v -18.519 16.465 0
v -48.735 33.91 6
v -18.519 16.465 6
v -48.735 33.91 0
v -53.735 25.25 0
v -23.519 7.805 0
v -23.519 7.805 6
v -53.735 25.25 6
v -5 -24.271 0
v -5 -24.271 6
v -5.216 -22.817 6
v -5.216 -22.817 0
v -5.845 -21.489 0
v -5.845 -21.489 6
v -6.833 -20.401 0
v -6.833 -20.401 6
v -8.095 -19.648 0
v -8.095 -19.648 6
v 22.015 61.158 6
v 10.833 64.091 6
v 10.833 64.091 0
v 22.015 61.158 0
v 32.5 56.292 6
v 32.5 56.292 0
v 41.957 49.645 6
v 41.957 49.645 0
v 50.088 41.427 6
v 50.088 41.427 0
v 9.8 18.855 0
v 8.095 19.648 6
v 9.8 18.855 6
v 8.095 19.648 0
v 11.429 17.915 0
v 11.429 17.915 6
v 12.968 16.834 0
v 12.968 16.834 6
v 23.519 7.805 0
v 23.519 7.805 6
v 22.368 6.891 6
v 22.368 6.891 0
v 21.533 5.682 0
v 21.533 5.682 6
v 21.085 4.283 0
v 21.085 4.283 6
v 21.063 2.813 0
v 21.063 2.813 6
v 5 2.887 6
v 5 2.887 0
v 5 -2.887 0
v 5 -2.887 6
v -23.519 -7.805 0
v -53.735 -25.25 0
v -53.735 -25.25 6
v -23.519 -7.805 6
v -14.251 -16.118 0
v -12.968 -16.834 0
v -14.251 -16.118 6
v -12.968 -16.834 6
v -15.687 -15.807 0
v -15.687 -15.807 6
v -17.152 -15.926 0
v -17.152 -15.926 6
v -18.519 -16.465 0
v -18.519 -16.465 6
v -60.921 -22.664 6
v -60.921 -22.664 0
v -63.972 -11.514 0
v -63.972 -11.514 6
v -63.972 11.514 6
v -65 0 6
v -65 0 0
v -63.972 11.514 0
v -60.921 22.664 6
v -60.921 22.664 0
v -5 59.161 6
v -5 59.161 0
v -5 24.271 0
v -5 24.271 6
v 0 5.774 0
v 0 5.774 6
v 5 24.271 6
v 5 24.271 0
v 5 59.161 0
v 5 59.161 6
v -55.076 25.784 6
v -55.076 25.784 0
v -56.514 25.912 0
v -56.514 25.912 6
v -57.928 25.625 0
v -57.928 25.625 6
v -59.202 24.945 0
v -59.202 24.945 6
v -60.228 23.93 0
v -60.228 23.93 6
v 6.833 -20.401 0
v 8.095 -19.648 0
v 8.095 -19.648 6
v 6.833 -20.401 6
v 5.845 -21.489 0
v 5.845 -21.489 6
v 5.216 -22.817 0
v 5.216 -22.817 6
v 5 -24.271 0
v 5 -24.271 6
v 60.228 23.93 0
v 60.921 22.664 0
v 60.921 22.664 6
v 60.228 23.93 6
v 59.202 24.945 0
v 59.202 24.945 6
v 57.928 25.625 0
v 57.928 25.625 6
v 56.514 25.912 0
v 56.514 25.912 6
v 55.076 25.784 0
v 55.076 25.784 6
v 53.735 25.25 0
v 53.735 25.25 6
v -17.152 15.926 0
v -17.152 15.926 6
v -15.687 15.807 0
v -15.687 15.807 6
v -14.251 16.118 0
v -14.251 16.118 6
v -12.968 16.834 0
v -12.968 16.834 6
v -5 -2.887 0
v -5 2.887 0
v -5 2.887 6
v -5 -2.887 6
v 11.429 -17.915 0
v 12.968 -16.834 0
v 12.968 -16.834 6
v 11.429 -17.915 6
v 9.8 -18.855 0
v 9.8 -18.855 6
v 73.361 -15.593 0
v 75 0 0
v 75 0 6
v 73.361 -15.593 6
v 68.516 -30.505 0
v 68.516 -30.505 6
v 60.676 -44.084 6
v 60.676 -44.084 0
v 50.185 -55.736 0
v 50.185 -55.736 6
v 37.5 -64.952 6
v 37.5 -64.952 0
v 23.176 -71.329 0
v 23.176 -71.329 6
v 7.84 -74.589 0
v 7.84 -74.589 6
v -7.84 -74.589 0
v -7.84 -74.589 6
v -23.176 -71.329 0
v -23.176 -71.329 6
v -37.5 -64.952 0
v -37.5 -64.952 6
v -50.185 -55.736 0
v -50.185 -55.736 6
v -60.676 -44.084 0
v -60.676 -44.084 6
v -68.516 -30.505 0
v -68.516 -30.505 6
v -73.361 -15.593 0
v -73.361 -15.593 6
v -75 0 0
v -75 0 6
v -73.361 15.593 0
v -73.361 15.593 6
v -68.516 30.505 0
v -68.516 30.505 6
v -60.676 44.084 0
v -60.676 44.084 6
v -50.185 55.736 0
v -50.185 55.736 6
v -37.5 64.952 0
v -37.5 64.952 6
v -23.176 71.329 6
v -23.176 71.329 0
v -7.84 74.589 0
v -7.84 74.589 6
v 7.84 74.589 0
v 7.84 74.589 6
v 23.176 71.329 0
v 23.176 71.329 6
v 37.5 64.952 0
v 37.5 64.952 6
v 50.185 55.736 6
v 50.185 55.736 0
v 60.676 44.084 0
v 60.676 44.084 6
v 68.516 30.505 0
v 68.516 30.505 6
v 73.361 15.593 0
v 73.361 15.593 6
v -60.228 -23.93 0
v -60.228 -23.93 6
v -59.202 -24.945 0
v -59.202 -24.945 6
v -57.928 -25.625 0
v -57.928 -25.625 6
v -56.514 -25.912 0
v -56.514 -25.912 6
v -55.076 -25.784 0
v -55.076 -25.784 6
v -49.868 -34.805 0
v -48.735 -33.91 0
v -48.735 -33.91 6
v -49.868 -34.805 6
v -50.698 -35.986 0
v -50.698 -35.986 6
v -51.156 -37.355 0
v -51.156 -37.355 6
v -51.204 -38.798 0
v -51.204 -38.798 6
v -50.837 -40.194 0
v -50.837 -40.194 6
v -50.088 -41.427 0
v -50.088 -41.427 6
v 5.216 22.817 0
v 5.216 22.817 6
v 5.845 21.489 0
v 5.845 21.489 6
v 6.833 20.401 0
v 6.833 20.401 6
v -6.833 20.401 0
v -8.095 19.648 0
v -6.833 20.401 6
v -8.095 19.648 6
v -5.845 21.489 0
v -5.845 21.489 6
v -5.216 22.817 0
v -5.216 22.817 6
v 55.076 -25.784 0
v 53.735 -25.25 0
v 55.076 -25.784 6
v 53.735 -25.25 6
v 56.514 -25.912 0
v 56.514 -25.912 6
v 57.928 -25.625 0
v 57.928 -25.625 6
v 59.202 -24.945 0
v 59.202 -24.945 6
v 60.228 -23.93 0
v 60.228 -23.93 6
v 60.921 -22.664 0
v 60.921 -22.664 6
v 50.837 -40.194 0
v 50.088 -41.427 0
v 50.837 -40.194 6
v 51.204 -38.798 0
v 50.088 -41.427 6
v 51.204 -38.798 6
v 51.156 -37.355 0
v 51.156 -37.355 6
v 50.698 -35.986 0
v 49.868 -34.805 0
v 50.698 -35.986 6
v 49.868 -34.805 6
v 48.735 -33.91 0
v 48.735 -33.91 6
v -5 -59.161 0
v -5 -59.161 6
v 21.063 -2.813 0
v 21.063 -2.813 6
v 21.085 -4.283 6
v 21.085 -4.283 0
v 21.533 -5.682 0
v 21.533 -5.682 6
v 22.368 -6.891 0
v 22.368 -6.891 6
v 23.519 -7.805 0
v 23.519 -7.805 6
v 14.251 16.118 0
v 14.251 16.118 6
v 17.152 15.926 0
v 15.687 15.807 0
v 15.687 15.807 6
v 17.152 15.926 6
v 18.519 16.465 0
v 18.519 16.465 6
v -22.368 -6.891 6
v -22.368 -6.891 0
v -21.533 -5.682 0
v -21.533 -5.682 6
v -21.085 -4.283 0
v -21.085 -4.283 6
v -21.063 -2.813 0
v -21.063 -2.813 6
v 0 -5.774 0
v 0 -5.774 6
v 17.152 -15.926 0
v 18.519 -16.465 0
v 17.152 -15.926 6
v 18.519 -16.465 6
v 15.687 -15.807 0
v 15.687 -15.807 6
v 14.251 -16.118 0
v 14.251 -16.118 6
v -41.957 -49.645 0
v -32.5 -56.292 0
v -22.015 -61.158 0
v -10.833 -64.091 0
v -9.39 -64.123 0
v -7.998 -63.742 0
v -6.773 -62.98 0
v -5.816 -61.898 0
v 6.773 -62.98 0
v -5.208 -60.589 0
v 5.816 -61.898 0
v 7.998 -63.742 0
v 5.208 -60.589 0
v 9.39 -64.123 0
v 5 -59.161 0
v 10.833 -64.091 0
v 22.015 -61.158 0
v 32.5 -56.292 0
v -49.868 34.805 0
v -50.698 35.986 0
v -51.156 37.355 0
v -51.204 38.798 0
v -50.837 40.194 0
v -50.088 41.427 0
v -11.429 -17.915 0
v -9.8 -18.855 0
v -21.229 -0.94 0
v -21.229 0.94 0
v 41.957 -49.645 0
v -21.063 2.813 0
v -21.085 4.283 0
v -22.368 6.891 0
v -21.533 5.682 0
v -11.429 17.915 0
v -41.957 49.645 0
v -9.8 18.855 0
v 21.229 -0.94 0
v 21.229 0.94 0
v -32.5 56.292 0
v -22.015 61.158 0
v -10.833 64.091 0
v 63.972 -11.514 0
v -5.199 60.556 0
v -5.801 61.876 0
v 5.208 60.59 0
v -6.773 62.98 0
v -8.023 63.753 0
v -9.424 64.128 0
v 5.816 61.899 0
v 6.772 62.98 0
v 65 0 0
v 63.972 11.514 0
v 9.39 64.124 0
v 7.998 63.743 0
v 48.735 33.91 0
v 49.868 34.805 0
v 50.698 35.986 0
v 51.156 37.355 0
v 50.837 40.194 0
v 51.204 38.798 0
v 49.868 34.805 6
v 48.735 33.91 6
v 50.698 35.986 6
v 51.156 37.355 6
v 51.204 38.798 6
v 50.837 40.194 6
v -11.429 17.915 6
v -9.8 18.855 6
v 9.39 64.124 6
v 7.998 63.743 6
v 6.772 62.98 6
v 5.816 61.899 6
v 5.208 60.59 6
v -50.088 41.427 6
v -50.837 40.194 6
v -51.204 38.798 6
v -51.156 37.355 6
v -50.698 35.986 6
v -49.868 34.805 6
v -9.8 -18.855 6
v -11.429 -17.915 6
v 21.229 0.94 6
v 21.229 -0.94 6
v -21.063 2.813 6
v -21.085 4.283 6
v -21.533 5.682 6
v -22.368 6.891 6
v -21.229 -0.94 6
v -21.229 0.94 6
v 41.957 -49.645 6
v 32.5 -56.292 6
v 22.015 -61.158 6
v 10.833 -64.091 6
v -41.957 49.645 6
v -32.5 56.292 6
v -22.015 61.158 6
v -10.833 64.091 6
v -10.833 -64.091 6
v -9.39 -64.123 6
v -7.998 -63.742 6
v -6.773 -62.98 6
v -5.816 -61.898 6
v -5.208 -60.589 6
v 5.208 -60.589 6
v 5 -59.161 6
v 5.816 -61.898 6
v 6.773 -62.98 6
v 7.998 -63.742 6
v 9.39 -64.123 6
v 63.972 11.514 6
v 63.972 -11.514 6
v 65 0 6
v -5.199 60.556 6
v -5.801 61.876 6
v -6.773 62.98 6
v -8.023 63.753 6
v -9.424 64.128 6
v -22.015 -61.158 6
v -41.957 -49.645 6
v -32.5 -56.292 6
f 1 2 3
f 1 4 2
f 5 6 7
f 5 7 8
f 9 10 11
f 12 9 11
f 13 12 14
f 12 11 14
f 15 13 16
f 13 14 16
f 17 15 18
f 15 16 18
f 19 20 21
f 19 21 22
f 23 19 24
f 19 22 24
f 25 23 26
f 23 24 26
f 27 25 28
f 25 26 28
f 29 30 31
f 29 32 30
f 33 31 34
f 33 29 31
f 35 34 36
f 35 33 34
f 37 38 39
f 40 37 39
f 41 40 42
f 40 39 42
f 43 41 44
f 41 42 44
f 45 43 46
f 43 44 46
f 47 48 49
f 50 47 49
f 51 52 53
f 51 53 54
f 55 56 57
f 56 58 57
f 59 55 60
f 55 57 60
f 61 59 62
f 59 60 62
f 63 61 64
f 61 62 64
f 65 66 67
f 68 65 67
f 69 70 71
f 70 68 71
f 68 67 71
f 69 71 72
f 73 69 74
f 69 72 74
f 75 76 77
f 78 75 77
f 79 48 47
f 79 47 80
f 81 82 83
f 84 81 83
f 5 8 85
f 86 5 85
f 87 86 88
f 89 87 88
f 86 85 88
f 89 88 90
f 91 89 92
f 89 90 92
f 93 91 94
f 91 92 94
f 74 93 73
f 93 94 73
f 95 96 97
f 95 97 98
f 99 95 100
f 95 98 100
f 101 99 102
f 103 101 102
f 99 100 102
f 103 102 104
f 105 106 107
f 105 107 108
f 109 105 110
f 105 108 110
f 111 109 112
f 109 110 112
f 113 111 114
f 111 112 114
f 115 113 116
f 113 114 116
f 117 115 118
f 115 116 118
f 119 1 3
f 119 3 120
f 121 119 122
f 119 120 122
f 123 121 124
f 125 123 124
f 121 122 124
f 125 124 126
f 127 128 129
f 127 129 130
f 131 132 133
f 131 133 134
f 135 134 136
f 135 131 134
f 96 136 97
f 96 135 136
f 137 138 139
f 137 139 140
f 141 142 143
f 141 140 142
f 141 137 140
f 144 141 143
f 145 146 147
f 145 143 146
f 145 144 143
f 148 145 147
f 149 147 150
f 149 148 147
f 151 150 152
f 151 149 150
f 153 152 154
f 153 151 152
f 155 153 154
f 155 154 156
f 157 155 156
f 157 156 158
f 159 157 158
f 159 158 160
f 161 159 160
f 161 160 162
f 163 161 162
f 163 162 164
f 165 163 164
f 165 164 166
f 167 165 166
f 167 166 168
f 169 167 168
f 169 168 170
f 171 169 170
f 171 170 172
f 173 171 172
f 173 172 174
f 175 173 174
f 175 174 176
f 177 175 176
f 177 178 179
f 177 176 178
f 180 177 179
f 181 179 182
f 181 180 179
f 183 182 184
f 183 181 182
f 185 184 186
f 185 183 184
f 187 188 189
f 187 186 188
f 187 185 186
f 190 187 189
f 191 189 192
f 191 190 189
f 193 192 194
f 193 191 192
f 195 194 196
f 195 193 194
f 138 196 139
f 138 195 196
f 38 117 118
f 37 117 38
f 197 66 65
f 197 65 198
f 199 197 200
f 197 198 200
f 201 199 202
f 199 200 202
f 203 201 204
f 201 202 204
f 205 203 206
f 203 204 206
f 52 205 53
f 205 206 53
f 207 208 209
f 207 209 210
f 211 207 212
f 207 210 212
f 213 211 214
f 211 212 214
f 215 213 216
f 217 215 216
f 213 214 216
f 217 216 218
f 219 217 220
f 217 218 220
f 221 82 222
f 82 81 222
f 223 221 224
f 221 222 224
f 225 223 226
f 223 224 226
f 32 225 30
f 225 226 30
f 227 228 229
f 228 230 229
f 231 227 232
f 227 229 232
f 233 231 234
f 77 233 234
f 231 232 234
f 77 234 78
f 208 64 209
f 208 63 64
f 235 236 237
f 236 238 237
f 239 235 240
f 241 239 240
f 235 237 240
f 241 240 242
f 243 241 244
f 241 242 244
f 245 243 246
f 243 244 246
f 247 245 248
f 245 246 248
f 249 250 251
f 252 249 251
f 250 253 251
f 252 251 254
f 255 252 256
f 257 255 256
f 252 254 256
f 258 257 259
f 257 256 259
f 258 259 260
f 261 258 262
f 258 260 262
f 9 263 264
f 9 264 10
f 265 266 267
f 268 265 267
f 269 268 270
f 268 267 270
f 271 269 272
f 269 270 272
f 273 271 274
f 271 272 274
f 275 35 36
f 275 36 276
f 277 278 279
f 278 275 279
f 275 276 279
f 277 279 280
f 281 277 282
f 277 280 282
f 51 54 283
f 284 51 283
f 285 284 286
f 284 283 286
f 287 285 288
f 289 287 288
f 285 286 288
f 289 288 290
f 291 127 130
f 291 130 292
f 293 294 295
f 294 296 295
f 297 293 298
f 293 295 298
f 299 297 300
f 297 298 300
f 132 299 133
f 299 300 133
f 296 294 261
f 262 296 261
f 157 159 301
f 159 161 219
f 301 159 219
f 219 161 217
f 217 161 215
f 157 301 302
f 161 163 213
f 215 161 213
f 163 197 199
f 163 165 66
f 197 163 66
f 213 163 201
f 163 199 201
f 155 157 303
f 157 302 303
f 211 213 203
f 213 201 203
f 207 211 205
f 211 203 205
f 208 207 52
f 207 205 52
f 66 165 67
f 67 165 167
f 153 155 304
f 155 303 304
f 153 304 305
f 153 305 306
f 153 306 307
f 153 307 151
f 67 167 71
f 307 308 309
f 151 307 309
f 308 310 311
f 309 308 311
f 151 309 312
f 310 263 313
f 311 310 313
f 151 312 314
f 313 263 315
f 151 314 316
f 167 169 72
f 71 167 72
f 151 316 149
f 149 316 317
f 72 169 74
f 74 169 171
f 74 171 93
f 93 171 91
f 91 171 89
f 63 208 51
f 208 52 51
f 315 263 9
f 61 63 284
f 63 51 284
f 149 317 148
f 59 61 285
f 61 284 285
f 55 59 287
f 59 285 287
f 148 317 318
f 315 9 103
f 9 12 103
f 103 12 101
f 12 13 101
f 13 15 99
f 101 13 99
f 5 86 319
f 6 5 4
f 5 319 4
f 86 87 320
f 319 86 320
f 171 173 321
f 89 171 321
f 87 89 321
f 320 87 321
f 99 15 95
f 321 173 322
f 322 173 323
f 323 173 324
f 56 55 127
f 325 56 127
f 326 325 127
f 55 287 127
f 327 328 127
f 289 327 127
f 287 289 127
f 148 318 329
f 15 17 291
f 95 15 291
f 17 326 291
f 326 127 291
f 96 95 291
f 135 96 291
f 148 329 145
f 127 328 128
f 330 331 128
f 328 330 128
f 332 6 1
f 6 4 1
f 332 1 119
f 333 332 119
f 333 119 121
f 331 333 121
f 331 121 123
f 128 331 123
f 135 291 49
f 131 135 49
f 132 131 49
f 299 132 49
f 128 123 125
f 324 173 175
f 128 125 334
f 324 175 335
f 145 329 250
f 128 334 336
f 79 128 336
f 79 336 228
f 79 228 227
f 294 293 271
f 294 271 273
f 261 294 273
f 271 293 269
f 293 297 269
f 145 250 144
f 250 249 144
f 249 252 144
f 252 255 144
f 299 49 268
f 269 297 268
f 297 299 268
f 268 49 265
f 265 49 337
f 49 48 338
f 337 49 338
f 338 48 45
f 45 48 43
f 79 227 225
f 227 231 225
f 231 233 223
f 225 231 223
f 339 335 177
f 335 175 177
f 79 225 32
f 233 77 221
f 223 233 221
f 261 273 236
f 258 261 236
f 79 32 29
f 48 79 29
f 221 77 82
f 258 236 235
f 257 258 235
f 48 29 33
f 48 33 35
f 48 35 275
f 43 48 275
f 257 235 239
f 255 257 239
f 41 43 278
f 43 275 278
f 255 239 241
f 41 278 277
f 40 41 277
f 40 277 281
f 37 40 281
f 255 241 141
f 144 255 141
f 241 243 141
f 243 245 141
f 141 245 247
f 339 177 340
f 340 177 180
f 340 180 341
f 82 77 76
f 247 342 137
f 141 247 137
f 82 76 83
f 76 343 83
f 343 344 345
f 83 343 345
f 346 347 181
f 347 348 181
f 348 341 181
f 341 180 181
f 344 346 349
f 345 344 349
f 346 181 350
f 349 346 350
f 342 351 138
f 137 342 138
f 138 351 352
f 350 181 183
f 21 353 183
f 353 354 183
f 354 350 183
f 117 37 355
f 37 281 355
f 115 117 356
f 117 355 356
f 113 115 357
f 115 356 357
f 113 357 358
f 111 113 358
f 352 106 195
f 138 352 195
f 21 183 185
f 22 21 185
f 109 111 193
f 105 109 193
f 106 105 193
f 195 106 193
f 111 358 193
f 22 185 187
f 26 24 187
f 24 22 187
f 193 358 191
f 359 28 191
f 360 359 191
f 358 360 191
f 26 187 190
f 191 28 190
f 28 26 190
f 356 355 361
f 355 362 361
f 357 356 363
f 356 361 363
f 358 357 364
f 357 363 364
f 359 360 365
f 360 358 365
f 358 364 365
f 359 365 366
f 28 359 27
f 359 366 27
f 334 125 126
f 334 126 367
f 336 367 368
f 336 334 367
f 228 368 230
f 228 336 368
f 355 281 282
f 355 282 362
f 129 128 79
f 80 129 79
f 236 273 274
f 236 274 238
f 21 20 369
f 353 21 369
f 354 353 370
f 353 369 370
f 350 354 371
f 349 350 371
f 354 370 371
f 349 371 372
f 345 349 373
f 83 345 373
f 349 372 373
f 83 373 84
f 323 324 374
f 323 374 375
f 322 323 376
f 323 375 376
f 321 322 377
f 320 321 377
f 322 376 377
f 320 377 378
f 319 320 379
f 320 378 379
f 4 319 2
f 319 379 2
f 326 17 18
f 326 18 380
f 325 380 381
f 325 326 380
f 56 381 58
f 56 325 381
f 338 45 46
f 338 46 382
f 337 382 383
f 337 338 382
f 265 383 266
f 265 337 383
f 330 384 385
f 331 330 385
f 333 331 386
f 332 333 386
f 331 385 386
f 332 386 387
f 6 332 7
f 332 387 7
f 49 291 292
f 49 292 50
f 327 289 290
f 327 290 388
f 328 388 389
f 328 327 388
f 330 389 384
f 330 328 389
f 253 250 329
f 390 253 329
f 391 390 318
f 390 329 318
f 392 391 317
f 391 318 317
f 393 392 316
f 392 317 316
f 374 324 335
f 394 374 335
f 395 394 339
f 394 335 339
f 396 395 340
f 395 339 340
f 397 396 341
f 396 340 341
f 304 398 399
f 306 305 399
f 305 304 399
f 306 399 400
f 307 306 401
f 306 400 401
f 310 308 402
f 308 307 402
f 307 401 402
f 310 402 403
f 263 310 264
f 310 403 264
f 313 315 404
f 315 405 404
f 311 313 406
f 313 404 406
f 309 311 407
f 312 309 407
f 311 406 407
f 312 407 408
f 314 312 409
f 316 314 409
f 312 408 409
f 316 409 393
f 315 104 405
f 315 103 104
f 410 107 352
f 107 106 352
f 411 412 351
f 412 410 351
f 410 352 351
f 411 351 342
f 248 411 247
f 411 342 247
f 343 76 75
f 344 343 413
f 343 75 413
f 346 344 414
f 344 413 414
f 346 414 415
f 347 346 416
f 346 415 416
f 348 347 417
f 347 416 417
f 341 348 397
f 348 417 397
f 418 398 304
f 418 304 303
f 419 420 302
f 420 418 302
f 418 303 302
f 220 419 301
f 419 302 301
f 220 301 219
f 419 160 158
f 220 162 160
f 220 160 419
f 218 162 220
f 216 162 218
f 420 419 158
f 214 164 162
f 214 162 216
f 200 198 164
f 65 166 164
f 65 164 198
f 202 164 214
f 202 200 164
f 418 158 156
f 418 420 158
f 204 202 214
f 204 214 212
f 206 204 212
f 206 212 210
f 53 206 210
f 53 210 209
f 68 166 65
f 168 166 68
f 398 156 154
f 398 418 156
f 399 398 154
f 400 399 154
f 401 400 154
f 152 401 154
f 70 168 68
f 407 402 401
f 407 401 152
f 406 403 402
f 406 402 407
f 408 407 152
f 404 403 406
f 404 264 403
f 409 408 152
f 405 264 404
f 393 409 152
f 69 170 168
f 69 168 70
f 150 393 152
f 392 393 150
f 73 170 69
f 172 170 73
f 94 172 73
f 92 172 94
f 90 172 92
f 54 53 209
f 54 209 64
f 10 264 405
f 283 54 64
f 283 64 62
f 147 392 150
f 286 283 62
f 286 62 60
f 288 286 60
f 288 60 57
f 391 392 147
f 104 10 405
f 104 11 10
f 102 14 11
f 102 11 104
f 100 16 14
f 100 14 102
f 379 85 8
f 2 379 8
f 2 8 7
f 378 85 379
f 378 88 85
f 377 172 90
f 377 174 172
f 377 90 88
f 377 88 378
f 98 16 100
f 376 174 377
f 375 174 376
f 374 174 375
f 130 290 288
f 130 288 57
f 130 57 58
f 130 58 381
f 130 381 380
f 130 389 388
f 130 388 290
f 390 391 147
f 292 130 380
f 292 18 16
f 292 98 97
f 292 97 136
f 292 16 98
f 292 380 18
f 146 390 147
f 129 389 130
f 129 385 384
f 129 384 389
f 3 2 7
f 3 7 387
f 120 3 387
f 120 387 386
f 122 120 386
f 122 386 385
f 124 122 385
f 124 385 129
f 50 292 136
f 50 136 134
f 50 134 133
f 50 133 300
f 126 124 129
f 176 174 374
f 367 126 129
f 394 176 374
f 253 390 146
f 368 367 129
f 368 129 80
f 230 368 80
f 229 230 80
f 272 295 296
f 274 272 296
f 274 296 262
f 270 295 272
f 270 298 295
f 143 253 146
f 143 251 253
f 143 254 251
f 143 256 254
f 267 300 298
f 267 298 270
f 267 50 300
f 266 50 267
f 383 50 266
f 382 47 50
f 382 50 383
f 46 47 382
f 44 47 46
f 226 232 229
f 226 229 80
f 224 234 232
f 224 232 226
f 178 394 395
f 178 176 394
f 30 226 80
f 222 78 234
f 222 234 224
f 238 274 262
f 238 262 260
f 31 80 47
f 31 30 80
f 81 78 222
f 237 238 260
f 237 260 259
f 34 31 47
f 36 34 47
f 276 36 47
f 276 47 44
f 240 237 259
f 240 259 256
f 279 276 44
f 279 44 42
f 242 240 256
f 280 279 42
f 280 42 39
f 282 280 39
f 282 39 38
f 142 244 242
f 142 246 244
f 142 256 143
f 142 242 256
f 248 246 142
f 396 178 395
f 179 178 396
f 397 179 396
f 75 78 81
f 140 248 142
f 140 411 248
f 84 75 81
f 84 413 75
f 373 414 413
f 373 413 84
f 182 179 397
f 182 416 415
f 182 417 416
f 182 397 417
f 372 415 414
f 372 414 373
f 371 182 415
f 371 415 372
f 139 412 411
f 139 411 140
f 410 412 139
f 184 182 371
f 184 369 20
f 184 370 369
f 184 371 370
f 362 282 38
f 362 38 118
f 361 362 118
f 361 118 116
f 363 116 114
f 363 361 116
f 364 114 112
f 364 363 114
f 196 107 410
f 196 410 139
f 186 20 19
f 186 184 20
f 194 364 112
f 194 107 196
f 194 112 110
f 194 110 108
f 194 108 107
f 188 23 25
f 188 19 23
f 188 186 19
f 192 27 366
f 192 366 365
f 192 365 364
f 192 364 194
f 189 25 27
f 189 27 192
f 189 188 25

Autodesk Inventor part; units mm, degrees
ref_plane "YZ Plane" through (0, 0, 0) normal (1, 0, 0) x (0, 1, 0)
ref_plane "XZ Plane" through (0, 0, 0) normal (0, 1, 0) x (-1, 0, 0)
ref_plane "XY Plane" through (0, 0, 0) normal (0, 0, 1) x (1, 0, 0)
sketch "Sketch1" plane through (0, 0, 0) normal (0, 0, 1) x (1, 0, 0)
  circle A0 centre (0, 0) radius 75
  line L0 (-90.1494, 78.9771) -> (78.0254, 78.9771) construction
  line L1 (78.0254, 78.9771) -> (78.0254, -87.6961) construction
  line L2 (78.0254, -87.6961) -> (-90.1494, -87.6961) construction
  line L3 (-90.1494, -87.6961) -> (-90.1494, 78.9771) construction
  line L4 (-5, 62.2697) -> (-5, 20.6534)
  line L5 (5, 20.6534) -> (5, 59.1608)
  line L6 (15.3864, 14.6568) -> (53.6249, 36.7338)
  line L7 (58.6249, 28.0736) -> (20.3864, 5.9966)
  line L8 (20.3864, -5.9966) -> (58.6249, -28.0736)
  line L9 (15.3864, -14.6568) -> (53.6249, -36.7338)
  line L10 (5, -20.6534) -> (5, -64.8074)
  line L11 (-5, -64.8074) -> (-5, -20.6534)
  line L12 (-15.3864, -14.6568) -> (-53.6249, -36.7338)
  line L13 (-58.6249, -28.0736) -> (-20.3864, -5.9966)
  line L14 (-20.3864, 5.9966) -> (-58.6249, 28.0736)
  line L15 (-53.6249, 36.7338) -> (-15.3864, 14.6568)
  line L16 (5, 59.1608) -> (5, 64.8074)
  line L17 (-5, 62.2697) -> (-5, 64.8074)
  arc A1 (10.8333, 64.0909) -> (5, 59.1608) centre (10, 59.1608) ccw
  arc A2 (-5, 64.8074) -> (-53.6249, 36.7338) centre (0, 0) ccw
  arc A3 (-5, 20.6534) -> (-15.3864, 14.6568) centre (0, 0) ccw
  arc A4 (15.3864, 14.6568) -> (5, 20.6534) centre (0, 0) ccw
  arc A5 (53.6249, 36.7338) -> (5, 64.8074) centre (0, 0) ccw
  arc A6 (58.6249, -28.0736) -> (58.6249, 28.0736) centre (0, 0) ccw
  arc A7 (20.3864, -5.9966) -> (20.3864, 5.9966) centre (0, 0) ccw
  arc A8 (5, -20.6534) -> (15.3864, -14.6568) centre (0, 0) ccw
  arc A9 (5, -64.8074) -> (53.6249, -36.7338) centre (0, 0) ccw
  arc A10 (-20.3864, 5.9966) -> (-20.3864, -5.9966) centre (0, 0) ccw
  arc A11 (-15.3864, -14.6568) -> (-5, -20.6534) centre (0, 0) ccw
  arc A12 (-58.6249, 28.0736) -> (-58.6249, -28.0736) centre (0, 0) ccw
  arc A13 (-53.6249, -36.7338) -> (-5, -64.8074) centre (0, 0) ccw
  line L18 (5, 2.8868) -> (5, -2.8868)
  line L19 (-5, 2.8868) -> (0, 5.7735)
  line L20 (5, 2.8868) -> (0, 5.7735)
  line L21 (-5, 2.8868) -> (-5, -2.8868)
  line L22 (0, -5.7735) -> (5, -2.8868)
  line L23 (-5, -2.8868) -> (0, -5.7735)
  line L24 (0, 0) -> (0, 5.7735)
  dimension "d5" = 150
  dimension "d41" = 10
  dimension "d54" = 5
  dimension "d74" = 120
  dimension "d76" = 120
  dimension "d77" = 120
  dimension "d78" = 120
  dimension "d79" = 120
  dimension "d80" = 120
  dimension "d81" = 10
extrude "Extrusion1" add sketch "Sketch1" along normal blind 6
fillet "Fillet1" radius 5 1 edges at (5, 64.8074, 3)
fillet "Fillet2" radius 5 23 edges at (-53.6249, 36.7338, 3) (5, 20.6534, 3) (-53.6249, -36.7338, 3) (-58.6249, -28.0736, 3) (5, -64.8074, 3) (20.3864, -5.9966, 3) (15.3864, 14.6568, 3) (20.3864, 5.9966, 3) (15.3864, -14.6568, 3) (5, -20.6534, 3) (-20.3864, 5.9966, 3) (-15.3864, -14.6568, 3) (-5, -20.6534, 3) (53.6249, -36.7338, 3) (58.6249, 28.0736, 3) (-5, 64.8074, 3) (-5, 20.6534, 3) (-15.3864, 14.6568, 3) (58.6249, -28.0736, 3) (53.6249, 36.7338, 3) (-5, -64.8074, 3) (-20.3864, -5.9966, 3) (-58.6249, 28.0736, 3)
equation "\"BendRadius\" = Thickness"
equation "\"BendReliefWidth\" = Thickness"
equation "\"BendReliefDepth\" = 0.5 * Thickness"
equation "\"CornerReliefSize\" = 4 * Thickness"
equation "\"MinimumRemnant\" = 2 * Thickness"
equation "\"TransitionRadius\" = BendRadius"
equation "\"JacobiRadiusSize\" = BendRadius"
equation "\"GapSize\" = Thickness"
equation "\"Thickness\" = 0.5"
properties part number "wheel" material "Hardboard"
